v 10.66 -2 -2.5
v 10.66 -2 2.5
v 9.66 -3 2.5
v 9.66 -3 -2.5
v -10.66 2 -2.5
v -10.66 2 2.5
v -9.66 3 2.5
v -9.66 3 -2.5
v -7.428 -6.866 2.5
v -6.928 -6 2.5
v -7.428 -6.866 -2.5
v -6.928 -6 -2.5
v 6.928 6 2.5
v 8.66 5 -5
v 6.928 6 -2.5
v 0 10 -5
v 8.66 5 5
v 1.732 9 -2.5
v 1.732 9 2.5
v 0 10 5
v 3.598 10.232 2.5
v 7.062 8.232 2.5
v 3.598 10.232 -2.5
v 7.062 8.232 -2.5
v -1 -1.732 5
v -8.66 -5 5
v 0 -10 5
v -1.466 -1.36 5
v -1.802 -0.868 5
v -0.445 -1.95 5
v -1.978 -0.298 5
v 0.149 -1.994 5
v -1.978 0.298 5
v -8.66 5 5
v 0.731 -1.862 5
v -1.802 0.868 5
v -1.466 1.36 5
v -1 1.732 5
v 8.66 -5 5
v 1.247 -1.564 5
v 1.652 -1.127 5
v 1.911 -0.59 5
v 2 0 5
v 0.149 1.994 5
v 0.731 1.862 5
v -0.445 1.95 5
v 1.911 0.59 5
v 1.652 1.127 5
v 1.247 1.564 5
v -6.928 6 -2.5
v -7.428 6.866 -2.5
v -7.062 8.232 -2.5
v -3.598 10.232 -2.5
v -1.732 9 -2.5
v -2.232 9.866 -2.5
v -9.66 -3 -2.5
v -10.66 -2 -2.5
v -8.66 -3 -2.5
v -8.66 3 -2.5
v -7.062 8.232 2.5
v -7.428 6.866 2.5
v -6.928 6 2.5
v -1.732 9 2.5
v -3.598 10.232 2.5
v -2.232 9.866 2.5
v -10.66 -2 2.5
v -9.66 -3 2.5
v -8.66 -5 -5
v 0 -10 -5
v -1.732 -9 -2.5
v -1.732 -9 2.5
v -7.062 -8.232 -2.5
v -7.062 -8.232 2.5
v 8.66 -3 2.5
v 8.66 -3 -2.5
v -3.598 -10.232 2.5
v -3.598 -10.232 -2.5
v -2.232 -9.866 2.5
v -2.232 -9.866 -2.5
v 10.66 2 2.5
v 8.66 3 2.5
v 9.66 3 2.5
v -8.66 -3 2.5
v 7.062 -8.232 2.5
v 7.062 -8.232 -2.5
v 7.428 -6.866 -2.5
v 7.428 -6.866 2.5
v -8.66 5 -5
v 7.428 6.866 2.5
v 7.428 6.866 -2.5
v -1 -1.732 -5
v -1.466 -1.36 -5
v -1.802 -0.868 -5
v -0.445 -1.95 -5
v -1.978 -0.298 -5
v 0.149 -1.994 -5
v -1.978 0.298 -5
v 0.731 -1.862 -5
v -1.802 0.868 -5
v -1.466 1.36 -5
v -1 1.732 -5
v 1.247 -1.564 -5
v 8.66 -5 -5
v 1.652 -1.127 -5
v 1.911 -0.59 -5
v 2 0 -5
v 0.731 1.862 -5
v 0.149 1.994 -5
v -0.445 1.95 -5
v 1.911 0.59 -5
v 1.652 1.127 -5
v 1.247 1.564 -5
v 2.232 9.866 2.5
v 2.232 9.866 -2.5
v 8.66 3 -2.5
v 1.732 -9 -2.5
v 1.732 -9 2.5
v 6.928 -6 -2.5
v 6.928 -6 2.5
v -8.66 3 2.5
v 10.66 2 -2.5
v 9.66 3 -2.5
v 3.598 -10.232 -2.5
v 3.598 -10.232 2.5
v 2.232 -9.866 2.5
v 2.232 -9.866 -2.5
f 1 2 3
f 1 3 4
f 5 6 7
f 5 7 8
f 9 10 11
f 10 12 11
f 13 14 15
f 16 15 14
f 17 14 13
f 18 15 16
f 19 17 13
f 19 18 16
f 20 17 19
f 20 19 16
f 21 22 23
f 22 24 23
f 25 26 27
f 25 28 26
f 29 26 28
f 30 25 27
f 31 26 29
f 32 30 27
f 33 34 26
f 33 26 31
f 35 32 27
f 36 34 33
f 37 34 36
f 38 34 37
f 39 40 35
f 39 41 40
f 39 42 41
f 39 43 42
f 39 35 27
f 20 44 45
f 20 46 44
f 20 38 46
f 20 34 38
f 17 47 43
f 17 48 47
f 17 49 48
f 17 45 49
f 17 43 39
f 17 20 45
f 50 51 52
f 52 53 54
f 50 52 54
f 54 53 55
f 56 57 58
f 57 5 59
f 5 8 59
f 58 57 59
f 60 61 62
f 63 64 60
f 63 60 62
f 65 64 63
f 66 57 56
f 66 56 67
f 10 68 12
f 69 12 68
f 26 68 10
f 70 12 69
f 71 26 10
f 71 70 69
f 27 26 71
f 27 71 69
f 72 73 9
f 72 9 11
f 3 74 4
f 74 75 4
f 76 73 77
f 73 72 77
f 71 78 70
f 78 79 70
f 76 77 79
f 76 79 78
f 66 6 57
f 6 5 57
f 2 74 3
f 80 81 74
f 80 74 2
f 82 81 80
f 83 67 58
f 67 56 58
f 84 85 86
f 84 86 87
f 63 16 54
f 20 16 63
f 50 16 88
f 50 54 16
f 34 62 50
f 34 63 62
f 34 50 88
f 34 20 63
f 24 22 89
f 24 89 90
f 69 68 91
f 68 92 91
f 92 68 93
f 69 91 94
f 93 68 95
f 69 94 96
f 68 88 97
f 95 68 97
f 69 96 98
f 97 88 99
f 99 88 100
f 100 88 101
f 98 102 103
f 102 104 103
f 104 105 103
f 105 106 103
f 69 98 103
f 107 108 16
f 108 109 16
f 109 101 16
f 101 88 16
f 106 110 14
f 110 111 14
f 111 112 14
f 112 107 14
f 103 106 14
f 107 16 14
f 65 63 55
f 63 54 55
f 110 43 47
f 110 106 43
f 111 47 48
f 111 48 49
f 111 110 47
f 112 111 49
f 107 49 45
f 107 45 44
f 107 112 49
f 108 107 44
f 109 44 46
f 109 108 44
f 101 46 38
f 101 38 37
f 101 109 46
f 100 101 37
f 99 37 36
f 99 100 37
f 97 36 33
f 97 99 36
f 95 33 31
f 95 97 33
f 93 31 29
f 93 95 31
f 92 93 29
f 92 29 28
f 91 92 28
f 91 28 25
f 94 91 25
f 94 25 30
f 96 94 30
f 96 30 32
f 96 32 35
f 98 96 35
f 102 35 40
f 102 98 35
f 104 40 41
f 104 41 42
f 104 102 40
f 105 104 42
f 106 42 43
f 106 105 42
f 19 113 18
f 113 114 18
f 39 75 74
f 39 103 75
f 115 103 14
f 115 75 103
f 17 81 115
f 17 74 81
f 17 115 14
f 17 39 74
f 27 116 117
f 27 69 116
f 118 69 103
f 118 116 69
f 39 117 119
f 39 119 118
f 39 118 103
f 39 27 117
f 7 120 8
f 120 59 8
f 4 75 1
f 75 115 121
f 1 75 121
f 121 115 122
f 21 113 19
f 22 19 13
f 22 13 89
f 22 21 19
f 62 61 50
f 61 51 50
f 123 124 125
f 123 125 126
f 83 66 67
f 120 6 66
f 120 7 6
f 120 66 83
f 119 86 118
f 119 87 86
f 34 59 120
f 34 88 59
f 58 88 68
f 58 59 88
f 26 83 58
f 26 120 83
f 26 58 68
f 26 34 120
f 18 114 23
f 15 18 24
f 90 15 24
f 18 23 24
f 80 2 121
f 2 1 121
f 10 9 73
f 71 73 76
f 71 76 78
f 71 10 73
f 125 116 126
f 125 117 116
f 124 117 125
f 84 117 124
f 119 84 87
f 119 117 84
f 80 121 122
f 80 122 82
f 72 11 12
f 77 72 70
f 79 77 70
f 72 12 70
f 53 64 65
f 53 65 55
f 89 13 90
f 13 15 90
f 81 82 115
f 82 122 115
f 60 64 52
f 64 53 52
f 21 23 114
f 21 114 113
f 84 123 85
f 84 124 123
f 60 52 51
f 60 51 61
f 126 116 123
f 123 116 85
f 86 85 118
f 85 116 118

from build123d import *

# Parameters (mm, degrees)
F0_R     = 2
F1_DEPTH = 5
F3_DEPTH = 2.5
F4_SIZE  = 1


with BuildPart() as f1:
    # F0 (on Top) → F1 (new body, symmetric)
    with BuildSketch(Plane.XY):
        Polygon((8.660254, 5), (0, 10), (-8.660254, 5), (-8.660254, -5), (0, -10), (8.660254, -5), align=None)
        Circle(F0_R, mode=Mode.SUBTRACT)
    extrude(amount=F1_DEPTH, both=True)

    # F2 (on Top) → F3 (join, symmetric)
    with BuildSketch(Plane.XY):
        Polygon((10.660254, -3), (10.660254, 0), (10.660254, 3), (8.660254, 3), (8.660254, 0), (8.660254, -3), align=None)
        Polygon((7.928203, 7.732051), (5.330127, 9.232051), (2.732051, 10.732051), (1.732051, 9), (4.330127, 7.5), (6.928203, 6), align=None)
        Polygon((-2.732051, 10.732051), (-5.330127, 9.232051), (-7.928203, 7.732051), (-6.928203, 6), (-4.330127, 7.5), (-1.732051, 9), align=None)
        Polygon((-10.660254, 3), (-10.660254, 0), (-10.660254, -3), (-8.660254, -3), (-8.660254, 0), (-8.660254, 3), align=None)
        Polygon((-7.928203, -7.732051), (-5.330127, -9.232051), (-2.732051, -10.732051), (-1.732051, -9), (-4.330127, -7.5), (-6.928203, -6), align=None)
        Polygon((2.732051, -10.732051), (5.330127, -9.232051), (7.928203, -7.732051), (6.928203, -6), (4.330127, -7.5), (1.732051, -9), align=None)
    extrude(amount=F3_DEPTH, both=True)

    # F4
    f4_edges = [f1.edges().sort_by_distance(p)[0] for p in [
        (10.660254, 3, 0),
        (10.660254, -3, 0),
        (7.928203, -7.732051, 0),
        (2.732051, -10.732051, 0),
        (-2.732051, -10.732051, 0),
        (-7.928203, -7.732051, 0),
        (-10.660254, -3, 0),
        (-10.660254, 3, 0),
        (-7.928203, 7.732051, 0),
        (-2.732051, 10.732051, 0),
        (2.732051, 10.732051, 0),
        (7.928203, 7.732051, 0),
    ]]
    chamfer(f4_edges, length=F4_SIZE)


solid = f1.part
